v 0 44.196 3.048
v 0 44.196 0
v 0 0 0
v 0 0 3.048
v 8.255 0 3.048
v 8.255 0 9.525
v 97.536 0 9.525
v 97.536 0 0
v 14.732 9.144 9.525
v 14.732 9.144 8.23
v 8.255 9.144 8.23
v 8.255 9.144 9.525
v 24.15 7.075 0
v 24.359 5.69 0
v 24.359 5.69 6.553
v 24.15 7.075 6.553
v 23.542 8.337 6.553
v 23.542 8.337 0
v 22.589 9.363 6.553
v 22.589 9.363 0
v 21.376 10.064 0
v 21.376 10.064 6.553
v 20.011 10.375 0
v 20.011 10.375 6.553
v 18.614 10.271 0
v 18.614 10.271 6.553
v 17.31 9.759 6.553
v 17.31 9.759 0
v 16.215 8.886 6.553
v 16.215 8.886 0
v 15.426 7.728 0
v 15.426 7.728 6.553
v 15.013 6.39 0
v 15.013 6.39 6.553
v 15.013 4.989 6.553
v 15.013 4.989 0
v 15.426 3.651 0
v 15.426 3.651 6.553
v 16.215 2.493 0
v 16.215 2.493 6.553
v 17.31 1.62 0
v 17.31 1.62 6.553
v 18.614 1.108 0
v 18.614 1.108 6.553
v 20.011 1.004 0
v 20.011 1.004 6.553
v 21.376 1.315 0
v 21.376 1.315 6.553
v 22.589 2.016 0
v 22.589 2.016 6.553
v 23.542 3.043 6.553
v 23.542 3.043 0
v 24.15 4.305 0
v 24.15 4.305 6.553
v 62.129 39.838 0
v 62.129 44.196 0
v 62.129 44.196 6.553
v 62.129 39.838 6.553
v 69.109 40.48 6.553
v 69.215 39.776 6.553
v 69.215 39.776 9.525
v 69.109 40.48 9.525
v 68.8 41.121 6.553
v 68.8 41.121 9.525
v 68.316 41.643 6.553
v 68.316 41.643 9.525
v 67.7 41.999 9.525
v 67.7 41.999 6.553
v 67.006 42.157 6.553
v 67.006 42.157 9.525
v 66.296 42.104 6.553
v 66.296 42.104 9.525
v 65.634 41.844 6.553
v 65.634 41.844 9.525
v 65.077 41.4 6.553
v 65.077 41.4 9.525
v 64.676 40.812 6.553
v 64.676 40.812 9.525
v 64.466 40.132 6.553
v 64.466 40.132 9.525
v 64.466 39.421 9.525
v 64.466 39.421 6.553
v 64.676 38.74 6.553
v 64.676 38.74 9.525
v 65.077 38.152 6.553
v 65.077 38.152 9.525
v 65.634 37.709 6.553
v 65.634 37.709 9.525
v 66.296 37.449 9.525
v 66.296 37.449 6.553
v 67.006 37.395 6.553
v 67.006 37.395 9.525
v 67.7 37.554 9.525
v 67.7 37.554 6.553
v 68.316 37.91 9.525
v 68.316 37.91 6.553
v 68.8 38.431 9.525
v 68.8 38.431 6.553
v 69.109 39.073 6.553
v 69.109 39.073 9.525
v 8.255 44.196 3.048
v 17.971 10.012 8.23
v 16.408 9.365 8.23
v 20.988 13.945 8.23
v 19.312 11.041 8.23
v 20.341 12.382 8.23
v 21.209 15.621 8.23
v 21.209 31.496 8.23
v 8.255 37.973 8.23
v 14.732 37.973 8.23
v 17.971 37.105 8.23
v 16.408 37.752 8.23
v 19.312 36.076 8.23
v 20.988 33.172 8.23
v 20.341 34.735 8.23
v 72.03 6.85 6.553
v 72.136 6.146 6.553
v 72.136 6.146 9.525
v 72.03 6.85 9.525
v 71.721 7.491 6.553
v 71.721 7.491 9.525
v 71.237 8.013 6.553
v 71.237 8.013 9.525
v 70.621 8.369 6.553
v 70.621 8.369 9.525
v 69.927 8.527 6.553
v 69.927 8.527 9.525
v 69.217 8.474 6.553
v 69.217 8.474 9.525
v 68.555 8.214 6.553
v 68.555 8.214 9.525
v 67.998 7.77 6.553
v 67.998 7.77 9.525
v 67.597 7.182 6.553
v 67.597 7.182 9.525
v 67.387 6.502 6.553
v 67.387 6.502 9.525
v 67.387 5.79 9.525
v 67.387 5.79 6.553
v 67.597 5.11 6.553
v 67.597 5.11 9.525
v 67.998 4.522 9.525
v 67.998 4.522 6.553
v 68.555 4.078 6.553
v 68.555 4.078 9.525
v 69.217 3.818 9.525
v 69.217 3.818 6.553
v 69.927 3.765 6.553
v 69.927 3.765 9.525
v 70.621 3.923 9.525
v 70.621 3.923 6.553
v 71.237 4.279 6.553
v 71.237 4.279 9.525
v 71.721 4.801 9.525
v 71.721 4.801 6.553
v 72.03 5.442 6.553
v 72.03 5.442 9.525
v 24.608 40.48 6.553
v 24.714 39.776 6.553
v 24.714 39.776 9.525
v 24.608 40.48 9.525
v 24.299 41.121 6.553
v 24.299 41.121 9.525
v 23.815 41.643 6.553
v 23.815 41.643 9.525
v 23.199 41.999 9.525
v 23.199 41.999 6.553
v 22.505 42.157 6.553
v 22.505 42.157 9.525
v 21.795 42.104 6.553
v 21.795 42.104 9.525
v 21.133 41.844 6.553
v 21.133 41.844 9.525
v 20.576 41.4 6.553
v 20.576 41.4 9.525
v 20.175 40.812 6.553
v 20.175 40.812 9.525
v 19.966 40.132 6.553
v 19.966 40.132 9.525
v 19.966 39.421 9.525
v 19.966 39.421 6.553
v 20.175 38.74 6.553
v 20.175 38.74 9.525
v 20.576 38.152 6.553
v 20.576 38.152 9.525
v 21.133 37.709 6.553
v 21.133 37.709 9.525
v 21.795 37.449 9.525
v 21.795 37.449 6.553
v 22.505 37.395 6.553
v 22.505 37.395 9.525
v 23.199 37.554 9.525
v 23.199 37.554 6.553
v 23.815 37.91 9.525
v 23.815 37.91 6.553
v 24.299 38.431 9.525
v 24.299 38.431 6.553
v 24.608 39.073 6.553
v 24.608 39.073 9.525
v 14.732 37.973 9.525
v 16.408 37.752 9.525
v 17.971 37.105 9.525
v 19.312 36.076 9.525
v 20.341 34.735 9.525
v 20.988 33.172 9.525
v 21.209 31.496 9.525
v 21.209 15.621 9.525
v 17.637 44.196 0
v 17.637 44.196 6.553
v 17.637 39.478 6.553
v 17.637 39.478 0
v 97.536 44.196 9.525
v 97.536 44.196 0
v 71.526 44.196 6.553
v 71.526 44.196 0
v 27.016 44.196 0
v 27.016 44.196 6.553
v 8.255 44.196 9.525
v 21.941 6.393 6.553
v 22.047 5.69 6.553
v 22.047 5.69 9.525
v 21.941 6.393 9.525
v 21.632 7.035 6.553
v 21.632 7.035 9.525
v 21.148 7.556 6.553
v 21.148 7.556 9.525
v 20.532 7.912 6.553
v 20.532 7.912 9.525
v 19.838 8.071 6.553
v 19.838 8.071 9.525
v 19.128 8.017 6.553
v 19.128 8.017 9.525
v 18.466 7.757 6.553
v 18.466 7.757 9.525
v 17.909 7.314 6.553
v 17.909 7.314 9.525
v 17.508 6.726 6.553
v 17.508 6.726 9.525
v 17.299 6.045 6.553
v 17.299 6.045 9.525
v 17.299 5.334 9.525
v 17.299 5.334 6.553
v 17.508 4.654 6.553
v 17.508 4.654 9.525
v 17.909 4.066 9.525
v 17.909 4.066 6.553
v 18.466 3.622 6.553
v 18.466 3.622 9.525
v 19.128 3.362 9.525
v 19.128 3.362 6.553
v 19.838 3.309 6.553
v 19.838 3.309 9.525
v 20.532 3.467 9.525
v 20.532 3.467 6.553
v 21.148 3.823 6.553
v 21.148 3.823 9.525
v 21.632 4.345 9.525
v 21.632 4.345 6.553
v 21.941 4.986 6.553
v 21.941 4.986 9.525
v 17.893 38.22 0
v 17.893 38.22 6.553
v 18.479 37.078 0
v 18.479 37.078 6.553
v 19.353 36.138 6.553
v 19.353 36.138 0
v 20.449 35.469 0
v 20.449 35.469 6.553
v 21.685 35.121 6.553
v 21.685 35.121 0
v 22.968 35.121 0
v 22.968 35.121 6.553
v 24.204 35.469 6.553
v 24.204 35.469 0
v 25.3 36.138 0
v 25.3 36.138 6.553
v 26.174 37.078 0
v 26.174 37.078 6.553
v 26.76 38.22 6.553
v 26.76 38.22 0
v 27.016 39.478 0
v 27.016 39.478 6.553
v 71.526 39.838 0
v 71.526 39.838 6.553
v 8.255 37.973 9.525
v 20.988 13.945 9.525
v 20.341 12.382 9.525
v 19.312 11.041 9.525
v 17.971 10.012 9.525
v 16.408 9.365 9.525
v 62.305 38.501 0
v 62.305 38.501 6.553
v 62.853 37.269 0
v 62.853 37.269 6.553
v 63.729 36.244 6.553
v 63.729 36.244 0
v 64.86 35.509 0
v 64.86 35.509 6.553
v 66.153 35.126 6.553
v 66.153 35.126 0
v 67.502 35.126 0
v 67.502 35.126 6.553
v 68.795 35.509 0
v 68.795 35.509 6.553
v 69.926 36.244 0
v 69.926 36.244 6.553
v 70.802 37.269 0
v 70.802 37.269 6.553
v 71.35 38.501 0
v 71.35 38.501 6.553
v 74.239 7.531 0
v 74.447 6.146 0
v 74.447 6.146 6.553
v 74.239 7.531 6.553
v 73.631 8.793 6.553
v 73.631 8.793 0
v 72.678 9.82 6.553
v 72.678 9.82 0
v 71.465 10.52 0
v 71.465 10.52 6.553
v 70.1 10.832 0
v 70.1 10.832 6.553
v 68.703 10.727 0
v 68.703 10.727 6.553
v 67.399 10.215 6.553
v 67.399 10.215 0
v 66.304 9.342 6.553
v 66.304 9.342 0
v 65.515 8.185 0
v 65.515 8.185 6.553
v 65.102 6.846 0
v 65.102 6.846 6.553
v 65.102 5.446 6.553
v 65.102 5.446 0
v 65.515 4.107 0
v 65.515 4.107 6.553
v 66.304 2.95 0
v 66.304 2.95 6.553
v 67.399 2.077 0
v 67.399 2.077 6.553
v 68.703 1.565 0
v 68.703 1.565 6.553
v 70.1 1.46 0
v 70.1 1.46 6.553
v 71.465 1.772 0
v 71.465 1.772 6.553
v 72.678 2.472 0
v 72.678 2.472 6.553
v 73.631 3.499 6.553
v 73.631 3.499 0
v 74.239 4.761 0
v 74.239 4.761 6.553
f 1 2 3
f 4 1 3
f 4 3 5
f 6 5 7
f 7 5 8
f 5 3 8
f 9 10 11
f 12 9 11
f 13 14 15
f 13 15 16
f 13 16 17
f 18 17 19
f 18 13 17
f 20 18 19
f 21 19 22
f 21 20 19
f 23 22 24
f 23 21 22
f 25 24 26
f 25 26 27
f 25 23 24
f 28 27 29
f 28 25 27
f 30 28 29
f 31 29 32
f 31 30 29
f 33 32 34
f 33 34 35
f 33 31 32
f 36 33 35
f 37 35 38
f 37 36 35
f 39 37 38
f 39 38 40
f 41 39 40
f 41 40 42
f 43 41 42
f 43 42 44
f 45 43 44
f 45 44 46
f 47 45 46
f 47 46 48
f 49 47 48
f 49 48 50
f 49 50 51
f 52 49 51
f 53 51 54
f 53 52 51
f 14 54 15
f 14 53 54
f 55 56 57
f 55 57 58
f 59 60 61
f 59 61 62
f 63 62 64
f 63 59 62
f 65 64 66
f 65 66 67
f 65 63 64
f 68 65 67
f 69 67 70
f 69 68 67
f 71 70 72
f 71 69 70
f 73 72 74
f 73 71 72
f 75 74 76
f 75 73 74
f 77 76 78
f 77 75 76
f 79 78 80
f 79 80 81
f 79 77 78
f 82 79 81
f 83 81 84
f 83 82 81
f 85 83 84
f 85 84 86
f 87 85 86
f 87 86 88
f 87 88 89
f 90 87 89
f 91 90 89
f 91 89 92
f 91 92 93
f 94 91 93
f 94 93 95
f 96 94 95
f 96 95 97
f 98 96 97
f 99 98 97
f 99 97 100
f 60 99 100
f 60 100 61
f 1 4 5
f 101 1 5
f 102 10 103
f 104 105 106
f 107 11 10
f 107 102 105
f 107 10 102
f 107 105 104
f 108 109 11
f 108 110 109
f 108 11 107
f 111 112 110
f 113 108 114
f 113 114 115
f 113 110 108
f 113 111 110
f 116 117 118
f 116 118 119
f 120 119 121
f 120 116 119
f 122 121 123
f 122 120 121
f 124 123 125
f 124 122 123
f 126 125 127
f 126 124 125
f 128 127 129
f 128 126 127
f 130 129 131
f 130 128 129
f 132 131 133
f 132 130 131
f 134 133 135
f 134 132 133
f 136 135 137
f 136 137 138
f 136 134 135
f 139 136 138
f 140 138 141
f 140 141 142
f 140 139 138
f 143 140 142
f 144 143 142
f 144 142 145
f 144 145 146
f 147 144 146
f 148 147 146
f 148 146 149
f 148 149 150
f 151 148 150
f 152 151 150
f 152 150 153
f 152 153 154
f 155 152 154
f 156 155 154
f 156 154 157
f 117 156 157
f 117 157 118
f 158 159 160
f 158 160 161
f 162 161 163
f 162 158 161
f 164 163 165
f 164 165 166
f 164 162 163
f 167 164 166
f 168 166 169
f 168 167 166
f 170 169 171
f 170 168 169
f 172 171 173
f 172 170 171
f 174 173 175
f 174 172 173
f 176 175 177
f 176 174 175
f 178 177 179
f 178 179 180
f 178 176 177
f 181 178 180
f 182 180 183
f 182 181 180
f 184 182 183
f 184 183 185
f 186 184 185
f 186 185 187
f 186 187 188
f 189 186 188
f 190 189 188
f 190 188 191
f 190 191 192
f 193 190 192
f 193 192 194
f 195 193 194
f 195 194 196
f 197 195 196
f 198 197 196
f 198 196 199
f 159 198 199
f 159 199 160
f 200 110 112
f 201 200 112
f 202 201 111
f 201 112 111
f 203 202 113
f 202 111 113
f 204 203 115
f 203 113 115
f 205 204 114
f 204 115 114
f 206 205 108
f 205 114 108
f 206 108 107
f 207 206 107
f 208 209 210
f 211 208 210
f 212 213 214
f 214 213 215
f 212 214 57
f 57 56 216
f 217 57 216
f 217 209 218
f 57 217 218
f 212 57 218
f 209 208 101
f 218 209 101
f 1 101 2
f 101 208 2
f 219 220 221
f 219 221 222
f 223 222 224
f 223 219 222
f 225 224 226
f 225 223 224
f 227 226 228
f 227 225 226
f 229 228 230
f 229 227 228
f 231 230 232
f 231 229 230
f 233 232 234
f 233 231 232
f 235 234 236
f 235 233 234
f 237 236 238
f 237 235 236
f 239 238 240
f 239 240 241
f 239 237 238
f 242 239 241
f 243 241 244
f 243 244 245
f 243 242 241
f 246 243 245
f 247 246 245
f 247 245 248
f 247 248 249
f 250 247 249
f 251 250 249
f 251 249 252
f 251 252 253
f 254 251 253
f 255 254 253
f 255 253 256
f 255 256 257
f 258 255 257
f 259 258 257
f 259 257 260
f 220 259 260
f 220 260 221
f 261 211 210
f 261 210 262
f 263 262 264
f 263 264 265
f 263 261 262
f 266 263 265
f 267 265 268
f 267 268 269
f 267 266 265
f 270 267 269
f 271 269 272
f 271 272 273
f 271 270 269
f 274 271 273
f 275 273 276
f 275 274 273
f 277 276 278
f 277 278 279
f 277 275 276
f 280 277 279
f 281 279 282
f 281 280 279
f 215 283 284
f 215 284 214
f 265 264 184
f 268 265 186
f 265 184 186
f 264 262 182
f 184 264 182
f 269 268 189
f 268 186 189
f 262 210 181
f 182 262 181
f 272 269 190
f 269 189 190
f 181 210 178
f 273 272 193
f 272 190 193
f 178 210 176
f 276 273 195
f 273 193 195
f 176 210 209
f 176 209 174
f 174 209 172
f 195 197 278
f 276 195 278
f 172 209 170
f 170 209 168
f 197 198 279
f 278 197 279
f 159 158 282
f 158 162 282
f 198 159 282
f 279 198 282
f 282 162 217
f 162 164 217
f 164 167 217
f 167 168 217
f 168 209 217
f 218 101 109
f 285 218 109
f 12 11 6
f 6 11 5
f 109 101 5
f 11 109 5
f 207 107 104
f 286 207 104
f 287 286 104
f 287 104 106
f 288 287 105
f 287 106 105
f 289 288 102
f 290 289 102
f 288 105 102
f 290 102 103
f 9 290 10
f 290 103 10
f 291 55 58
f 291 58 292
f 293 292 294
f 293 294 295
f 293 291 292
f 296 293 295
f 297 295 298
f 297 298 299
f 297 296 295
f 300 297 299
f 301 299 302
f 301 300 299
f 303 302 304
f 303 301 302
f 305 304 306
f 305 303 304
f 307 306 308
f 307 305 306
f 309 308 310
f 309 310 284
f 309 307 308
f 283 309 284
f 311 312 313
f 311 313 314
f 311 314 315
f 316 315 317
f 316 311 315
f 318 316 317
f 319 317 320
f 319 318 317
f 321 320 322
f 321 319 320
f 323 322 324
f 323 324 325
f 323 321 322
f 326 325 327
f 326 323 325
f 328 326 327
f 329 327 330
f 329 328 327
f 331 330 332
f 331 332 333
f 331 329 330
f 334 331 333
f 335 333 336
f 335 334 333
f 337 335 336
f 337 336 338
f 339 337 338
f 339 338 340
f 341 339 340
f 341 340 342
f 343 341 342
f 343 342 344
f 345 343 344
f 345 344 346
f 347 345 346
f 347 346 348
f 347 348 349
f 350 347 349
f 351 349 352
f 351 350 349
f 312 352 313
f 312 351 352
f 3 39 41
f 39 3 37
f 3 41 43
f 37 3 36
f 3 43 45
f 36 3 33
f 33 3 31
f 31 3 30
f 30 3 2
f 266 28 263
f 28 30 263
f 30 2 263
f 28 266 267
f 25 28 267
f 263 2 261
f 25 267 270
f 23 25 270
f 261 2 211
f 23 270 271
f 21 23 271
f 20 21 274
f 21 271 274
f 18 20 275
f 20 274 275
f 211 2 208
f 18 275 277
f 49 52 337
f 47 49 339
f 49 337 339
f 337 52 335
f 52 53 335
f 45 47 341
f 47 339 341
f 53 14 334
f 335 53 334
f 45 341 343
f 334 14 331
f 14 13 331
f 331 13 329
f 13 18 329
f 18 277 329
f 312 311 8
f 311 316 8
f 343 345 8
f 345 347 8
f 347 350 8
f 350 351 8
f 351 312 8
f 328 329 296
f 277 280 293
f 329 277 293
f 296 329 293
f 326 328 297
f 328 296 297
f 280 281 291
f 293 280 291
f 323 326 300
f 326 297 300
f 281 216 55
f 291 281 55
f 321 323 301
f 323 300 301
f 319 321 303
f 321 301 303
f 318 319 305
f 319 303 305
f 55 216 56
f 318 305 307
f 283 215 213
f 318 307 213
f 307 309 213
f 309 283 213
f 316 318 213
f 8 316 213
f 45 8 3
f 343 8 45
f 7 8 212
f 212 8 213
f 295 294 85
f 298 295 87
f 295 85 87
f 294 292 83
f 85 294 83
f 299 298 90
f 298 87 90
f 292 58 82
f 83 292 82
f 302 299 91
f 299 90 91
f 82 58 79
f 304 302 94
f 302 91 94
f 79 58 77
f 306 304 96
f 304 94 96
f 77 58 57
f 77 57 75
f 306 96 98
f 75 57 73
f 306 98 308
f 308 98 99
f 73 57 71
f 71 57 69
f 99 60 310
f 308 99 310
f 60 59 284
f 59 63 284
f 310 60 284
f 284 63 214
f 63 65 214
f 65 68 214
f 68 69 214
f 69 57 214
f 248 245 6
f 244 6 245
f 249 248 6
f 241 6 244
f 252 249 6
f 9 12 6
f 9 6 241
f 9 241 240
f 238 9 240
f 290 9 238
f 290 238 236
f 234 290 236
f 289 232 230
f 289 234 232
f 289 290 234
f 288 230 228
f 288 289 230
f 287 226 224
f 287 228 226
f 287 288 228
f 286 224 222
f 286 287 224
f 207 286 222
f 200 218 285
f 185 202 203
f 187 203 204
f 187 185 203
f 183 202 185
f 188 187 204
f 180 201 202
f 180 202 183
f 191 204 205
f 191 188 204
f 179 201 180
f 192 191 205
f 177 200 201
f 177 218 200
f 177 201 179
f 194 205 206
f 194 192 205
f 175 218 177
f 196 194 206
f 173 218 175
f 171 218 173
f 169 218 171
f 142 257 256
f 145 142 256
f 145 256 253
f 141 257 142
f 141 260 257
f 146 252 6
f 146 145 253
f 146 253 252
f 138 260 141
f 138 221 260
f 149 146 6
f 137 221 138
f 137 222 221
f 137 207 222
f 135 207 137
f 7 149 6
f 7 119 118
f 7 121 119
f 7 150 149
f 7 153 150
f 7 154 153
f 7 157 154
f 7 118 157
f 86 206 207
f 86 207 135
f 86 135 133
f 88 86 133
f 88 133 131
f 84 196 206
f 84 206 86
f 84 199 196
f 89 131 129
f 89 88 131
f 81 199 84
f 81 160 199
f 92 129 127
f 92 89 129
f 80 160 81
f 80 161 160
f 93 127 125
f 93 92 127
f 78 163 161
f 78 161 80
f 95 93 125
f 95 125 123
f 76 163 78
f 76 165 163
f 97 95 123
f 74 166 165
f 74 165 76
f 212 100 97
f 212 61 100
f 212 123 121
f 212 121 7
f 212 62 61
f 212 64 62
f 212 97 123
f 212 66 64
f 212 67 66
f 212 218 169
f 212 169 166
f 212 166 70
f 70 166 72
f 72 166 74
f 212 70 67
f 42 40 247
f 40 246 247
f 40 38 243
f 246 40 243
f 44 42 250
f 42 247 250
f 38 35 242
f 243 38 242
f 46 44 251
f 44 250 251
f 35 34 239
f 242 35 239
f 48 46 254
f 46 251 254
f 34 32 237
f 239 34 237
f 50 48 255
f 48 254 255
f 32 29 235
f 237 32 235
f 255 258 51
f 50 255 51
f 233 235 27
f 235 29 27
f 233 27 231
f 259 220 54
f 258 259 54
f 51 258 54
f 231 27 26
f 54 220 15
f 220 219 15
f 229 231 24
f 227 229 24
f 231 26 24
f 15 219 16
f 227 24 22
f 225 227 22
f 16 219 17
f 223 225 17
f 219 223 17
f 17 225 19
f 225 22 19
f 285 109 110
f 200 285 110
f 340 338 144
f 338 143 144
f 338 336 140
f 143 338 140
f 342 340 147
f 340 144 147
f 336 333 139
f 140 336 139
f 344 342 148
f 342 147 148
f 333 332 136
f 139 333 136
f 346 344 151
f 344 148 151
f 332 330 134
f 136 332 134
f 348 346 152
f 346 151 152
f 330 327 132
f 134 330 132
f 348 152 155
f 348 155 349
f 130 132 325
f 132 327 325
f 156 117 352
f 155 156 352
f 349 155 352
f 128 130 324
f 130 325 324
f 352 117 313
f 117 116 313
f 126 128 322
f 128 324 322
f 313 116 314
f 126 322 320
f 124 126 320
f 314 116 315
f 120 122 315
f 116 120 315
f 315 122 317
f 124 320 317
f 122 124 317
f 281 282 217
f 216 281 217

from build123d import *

# Parameters (mm, degrees)
F1_DEPTH = 3.048
F2_DEPTH = 8.2296
F0_R     = 2.3876
F3_DEPTH = 9.525
F4_R     = 4.699
F4_R_2   = 2.3876
F5_DEPTH = 6.5532


with BuildPart() as f1:
    # F0 (on Top) → F1 (new body)
    with BuildSketch(Plane.XY):
        Polygon((0, 44.196), (0, 0), (8.255, 0), (8.255, 9.144), (8.255, 37.973), (8.255, 44.196), align=None)
    extrude(amount=F1_DEPTH)

    # F0 (on Top) → F2 (join)
    with BuildSketch(Plane.XY):
        with BuildLine():
            Line((8.255, 37.973), (8.255, 9.144))
            Line((8.255, 9.144), (14.732, 9.144))
            ThreePointArc((14.732, 9.144), (19.311931, 11.041069), (21.209, 15.621))
            Line((21.209, 15.621), (21.209, 31.496))
            ThreePointArc((21.209, 31.496), (19.311931, 36.075931), (14.732, 37.973))
            Line((14.732, 37.973), (8.255, 37.973))
        make_face()
    extrude(amount=F2_DEPTH)

    # F0 (on Top) → F3 (join)
    with BuildSketch(Plane.XY):
        with BuildLine():
            Line((8.255, 9.144), (8.255, 0))
            Line((8.255, 0), (97.536, 0))
            Line((97.536, 0), (97.536, 44.196))
            Line((97.536, 44.196), (8.255, 44.196))
            Line((8.255, 44.196), (8.255, 37.973))
            Line((8.255, 37.973), (14.732, 37.973))
            ThreePointArc((14.732, 37.973), (19.311931, 36.075931), (21.209, 31.496))
            Line((21.209, 31.496), (21.209, 15.621))
            ThreePointArc((21.209, 15.621), (19.311931, 11.041069), (14.732, 9.144))
            Line((14.732, 9.144), (8.255, 9.144))
        make_face()
        with Locations((19.6596, 5.6896)):
            Circle(F0_R, mode=Mode.SUBTRACT)
        with Locations((69.7484, 6.146022)):
            Circle(F0_R, mode=Mode.SUBTRACT)
        with Locations((22.3266, 39.7764)):
            Circle(F0_R, mode=Mode.SUBTRACT)
        with Locations((66.8274, 39.7764)):
            Circle(F0_R, mode=Mode.SUBTRACT)
    extrude(amount=F3_DEPTH)

    # F4 (on face) → F5 (cut)
    with BuildSketch(Plane.XY):
        with Locations((69.7484, 6.146022)):
            Circle(F4_R)
        with Locations((19.6596, 5.6896)):
            Circle(F4_R)
        with BuildLine():
            Line((71.525994, 39.838142), (71.525994, 44.196))
            Line((71.525994, 44.196), (62.128806, 44.196))
            Line((62.128806, 44.196), (62.128806, 39.838142))
            ThreePointArc((62.128806, 39.838142), (66.8274, 35.0774), (71.525994, 39.838142))
        make_face()
        with Locations((66.8274, 39.7764)):
            Circle(F4_R_2, mode=Mode.SUBTRACT)
        with BuildLine():
            Line((27.016125, 44.196), (17.637075, 44.196))
            Line((17.637075, 44.196), (17.637075, 39.478143))
            ThreePointArc((17.637075, 39.478143), (22.3266, 35.0774), (27.016125, 39.478143))
            Line((27.016125, 39.478143), (27.016125, 44.196))
        make_face()
        with Locations((22.3266, 39.7764)):
            Circle(F4_R_2, mode=Mode.SUBTRACT)
    extrude(amount=F5_DEPTH, mode=Mode.SUBTRACT)


solid = f1.part
